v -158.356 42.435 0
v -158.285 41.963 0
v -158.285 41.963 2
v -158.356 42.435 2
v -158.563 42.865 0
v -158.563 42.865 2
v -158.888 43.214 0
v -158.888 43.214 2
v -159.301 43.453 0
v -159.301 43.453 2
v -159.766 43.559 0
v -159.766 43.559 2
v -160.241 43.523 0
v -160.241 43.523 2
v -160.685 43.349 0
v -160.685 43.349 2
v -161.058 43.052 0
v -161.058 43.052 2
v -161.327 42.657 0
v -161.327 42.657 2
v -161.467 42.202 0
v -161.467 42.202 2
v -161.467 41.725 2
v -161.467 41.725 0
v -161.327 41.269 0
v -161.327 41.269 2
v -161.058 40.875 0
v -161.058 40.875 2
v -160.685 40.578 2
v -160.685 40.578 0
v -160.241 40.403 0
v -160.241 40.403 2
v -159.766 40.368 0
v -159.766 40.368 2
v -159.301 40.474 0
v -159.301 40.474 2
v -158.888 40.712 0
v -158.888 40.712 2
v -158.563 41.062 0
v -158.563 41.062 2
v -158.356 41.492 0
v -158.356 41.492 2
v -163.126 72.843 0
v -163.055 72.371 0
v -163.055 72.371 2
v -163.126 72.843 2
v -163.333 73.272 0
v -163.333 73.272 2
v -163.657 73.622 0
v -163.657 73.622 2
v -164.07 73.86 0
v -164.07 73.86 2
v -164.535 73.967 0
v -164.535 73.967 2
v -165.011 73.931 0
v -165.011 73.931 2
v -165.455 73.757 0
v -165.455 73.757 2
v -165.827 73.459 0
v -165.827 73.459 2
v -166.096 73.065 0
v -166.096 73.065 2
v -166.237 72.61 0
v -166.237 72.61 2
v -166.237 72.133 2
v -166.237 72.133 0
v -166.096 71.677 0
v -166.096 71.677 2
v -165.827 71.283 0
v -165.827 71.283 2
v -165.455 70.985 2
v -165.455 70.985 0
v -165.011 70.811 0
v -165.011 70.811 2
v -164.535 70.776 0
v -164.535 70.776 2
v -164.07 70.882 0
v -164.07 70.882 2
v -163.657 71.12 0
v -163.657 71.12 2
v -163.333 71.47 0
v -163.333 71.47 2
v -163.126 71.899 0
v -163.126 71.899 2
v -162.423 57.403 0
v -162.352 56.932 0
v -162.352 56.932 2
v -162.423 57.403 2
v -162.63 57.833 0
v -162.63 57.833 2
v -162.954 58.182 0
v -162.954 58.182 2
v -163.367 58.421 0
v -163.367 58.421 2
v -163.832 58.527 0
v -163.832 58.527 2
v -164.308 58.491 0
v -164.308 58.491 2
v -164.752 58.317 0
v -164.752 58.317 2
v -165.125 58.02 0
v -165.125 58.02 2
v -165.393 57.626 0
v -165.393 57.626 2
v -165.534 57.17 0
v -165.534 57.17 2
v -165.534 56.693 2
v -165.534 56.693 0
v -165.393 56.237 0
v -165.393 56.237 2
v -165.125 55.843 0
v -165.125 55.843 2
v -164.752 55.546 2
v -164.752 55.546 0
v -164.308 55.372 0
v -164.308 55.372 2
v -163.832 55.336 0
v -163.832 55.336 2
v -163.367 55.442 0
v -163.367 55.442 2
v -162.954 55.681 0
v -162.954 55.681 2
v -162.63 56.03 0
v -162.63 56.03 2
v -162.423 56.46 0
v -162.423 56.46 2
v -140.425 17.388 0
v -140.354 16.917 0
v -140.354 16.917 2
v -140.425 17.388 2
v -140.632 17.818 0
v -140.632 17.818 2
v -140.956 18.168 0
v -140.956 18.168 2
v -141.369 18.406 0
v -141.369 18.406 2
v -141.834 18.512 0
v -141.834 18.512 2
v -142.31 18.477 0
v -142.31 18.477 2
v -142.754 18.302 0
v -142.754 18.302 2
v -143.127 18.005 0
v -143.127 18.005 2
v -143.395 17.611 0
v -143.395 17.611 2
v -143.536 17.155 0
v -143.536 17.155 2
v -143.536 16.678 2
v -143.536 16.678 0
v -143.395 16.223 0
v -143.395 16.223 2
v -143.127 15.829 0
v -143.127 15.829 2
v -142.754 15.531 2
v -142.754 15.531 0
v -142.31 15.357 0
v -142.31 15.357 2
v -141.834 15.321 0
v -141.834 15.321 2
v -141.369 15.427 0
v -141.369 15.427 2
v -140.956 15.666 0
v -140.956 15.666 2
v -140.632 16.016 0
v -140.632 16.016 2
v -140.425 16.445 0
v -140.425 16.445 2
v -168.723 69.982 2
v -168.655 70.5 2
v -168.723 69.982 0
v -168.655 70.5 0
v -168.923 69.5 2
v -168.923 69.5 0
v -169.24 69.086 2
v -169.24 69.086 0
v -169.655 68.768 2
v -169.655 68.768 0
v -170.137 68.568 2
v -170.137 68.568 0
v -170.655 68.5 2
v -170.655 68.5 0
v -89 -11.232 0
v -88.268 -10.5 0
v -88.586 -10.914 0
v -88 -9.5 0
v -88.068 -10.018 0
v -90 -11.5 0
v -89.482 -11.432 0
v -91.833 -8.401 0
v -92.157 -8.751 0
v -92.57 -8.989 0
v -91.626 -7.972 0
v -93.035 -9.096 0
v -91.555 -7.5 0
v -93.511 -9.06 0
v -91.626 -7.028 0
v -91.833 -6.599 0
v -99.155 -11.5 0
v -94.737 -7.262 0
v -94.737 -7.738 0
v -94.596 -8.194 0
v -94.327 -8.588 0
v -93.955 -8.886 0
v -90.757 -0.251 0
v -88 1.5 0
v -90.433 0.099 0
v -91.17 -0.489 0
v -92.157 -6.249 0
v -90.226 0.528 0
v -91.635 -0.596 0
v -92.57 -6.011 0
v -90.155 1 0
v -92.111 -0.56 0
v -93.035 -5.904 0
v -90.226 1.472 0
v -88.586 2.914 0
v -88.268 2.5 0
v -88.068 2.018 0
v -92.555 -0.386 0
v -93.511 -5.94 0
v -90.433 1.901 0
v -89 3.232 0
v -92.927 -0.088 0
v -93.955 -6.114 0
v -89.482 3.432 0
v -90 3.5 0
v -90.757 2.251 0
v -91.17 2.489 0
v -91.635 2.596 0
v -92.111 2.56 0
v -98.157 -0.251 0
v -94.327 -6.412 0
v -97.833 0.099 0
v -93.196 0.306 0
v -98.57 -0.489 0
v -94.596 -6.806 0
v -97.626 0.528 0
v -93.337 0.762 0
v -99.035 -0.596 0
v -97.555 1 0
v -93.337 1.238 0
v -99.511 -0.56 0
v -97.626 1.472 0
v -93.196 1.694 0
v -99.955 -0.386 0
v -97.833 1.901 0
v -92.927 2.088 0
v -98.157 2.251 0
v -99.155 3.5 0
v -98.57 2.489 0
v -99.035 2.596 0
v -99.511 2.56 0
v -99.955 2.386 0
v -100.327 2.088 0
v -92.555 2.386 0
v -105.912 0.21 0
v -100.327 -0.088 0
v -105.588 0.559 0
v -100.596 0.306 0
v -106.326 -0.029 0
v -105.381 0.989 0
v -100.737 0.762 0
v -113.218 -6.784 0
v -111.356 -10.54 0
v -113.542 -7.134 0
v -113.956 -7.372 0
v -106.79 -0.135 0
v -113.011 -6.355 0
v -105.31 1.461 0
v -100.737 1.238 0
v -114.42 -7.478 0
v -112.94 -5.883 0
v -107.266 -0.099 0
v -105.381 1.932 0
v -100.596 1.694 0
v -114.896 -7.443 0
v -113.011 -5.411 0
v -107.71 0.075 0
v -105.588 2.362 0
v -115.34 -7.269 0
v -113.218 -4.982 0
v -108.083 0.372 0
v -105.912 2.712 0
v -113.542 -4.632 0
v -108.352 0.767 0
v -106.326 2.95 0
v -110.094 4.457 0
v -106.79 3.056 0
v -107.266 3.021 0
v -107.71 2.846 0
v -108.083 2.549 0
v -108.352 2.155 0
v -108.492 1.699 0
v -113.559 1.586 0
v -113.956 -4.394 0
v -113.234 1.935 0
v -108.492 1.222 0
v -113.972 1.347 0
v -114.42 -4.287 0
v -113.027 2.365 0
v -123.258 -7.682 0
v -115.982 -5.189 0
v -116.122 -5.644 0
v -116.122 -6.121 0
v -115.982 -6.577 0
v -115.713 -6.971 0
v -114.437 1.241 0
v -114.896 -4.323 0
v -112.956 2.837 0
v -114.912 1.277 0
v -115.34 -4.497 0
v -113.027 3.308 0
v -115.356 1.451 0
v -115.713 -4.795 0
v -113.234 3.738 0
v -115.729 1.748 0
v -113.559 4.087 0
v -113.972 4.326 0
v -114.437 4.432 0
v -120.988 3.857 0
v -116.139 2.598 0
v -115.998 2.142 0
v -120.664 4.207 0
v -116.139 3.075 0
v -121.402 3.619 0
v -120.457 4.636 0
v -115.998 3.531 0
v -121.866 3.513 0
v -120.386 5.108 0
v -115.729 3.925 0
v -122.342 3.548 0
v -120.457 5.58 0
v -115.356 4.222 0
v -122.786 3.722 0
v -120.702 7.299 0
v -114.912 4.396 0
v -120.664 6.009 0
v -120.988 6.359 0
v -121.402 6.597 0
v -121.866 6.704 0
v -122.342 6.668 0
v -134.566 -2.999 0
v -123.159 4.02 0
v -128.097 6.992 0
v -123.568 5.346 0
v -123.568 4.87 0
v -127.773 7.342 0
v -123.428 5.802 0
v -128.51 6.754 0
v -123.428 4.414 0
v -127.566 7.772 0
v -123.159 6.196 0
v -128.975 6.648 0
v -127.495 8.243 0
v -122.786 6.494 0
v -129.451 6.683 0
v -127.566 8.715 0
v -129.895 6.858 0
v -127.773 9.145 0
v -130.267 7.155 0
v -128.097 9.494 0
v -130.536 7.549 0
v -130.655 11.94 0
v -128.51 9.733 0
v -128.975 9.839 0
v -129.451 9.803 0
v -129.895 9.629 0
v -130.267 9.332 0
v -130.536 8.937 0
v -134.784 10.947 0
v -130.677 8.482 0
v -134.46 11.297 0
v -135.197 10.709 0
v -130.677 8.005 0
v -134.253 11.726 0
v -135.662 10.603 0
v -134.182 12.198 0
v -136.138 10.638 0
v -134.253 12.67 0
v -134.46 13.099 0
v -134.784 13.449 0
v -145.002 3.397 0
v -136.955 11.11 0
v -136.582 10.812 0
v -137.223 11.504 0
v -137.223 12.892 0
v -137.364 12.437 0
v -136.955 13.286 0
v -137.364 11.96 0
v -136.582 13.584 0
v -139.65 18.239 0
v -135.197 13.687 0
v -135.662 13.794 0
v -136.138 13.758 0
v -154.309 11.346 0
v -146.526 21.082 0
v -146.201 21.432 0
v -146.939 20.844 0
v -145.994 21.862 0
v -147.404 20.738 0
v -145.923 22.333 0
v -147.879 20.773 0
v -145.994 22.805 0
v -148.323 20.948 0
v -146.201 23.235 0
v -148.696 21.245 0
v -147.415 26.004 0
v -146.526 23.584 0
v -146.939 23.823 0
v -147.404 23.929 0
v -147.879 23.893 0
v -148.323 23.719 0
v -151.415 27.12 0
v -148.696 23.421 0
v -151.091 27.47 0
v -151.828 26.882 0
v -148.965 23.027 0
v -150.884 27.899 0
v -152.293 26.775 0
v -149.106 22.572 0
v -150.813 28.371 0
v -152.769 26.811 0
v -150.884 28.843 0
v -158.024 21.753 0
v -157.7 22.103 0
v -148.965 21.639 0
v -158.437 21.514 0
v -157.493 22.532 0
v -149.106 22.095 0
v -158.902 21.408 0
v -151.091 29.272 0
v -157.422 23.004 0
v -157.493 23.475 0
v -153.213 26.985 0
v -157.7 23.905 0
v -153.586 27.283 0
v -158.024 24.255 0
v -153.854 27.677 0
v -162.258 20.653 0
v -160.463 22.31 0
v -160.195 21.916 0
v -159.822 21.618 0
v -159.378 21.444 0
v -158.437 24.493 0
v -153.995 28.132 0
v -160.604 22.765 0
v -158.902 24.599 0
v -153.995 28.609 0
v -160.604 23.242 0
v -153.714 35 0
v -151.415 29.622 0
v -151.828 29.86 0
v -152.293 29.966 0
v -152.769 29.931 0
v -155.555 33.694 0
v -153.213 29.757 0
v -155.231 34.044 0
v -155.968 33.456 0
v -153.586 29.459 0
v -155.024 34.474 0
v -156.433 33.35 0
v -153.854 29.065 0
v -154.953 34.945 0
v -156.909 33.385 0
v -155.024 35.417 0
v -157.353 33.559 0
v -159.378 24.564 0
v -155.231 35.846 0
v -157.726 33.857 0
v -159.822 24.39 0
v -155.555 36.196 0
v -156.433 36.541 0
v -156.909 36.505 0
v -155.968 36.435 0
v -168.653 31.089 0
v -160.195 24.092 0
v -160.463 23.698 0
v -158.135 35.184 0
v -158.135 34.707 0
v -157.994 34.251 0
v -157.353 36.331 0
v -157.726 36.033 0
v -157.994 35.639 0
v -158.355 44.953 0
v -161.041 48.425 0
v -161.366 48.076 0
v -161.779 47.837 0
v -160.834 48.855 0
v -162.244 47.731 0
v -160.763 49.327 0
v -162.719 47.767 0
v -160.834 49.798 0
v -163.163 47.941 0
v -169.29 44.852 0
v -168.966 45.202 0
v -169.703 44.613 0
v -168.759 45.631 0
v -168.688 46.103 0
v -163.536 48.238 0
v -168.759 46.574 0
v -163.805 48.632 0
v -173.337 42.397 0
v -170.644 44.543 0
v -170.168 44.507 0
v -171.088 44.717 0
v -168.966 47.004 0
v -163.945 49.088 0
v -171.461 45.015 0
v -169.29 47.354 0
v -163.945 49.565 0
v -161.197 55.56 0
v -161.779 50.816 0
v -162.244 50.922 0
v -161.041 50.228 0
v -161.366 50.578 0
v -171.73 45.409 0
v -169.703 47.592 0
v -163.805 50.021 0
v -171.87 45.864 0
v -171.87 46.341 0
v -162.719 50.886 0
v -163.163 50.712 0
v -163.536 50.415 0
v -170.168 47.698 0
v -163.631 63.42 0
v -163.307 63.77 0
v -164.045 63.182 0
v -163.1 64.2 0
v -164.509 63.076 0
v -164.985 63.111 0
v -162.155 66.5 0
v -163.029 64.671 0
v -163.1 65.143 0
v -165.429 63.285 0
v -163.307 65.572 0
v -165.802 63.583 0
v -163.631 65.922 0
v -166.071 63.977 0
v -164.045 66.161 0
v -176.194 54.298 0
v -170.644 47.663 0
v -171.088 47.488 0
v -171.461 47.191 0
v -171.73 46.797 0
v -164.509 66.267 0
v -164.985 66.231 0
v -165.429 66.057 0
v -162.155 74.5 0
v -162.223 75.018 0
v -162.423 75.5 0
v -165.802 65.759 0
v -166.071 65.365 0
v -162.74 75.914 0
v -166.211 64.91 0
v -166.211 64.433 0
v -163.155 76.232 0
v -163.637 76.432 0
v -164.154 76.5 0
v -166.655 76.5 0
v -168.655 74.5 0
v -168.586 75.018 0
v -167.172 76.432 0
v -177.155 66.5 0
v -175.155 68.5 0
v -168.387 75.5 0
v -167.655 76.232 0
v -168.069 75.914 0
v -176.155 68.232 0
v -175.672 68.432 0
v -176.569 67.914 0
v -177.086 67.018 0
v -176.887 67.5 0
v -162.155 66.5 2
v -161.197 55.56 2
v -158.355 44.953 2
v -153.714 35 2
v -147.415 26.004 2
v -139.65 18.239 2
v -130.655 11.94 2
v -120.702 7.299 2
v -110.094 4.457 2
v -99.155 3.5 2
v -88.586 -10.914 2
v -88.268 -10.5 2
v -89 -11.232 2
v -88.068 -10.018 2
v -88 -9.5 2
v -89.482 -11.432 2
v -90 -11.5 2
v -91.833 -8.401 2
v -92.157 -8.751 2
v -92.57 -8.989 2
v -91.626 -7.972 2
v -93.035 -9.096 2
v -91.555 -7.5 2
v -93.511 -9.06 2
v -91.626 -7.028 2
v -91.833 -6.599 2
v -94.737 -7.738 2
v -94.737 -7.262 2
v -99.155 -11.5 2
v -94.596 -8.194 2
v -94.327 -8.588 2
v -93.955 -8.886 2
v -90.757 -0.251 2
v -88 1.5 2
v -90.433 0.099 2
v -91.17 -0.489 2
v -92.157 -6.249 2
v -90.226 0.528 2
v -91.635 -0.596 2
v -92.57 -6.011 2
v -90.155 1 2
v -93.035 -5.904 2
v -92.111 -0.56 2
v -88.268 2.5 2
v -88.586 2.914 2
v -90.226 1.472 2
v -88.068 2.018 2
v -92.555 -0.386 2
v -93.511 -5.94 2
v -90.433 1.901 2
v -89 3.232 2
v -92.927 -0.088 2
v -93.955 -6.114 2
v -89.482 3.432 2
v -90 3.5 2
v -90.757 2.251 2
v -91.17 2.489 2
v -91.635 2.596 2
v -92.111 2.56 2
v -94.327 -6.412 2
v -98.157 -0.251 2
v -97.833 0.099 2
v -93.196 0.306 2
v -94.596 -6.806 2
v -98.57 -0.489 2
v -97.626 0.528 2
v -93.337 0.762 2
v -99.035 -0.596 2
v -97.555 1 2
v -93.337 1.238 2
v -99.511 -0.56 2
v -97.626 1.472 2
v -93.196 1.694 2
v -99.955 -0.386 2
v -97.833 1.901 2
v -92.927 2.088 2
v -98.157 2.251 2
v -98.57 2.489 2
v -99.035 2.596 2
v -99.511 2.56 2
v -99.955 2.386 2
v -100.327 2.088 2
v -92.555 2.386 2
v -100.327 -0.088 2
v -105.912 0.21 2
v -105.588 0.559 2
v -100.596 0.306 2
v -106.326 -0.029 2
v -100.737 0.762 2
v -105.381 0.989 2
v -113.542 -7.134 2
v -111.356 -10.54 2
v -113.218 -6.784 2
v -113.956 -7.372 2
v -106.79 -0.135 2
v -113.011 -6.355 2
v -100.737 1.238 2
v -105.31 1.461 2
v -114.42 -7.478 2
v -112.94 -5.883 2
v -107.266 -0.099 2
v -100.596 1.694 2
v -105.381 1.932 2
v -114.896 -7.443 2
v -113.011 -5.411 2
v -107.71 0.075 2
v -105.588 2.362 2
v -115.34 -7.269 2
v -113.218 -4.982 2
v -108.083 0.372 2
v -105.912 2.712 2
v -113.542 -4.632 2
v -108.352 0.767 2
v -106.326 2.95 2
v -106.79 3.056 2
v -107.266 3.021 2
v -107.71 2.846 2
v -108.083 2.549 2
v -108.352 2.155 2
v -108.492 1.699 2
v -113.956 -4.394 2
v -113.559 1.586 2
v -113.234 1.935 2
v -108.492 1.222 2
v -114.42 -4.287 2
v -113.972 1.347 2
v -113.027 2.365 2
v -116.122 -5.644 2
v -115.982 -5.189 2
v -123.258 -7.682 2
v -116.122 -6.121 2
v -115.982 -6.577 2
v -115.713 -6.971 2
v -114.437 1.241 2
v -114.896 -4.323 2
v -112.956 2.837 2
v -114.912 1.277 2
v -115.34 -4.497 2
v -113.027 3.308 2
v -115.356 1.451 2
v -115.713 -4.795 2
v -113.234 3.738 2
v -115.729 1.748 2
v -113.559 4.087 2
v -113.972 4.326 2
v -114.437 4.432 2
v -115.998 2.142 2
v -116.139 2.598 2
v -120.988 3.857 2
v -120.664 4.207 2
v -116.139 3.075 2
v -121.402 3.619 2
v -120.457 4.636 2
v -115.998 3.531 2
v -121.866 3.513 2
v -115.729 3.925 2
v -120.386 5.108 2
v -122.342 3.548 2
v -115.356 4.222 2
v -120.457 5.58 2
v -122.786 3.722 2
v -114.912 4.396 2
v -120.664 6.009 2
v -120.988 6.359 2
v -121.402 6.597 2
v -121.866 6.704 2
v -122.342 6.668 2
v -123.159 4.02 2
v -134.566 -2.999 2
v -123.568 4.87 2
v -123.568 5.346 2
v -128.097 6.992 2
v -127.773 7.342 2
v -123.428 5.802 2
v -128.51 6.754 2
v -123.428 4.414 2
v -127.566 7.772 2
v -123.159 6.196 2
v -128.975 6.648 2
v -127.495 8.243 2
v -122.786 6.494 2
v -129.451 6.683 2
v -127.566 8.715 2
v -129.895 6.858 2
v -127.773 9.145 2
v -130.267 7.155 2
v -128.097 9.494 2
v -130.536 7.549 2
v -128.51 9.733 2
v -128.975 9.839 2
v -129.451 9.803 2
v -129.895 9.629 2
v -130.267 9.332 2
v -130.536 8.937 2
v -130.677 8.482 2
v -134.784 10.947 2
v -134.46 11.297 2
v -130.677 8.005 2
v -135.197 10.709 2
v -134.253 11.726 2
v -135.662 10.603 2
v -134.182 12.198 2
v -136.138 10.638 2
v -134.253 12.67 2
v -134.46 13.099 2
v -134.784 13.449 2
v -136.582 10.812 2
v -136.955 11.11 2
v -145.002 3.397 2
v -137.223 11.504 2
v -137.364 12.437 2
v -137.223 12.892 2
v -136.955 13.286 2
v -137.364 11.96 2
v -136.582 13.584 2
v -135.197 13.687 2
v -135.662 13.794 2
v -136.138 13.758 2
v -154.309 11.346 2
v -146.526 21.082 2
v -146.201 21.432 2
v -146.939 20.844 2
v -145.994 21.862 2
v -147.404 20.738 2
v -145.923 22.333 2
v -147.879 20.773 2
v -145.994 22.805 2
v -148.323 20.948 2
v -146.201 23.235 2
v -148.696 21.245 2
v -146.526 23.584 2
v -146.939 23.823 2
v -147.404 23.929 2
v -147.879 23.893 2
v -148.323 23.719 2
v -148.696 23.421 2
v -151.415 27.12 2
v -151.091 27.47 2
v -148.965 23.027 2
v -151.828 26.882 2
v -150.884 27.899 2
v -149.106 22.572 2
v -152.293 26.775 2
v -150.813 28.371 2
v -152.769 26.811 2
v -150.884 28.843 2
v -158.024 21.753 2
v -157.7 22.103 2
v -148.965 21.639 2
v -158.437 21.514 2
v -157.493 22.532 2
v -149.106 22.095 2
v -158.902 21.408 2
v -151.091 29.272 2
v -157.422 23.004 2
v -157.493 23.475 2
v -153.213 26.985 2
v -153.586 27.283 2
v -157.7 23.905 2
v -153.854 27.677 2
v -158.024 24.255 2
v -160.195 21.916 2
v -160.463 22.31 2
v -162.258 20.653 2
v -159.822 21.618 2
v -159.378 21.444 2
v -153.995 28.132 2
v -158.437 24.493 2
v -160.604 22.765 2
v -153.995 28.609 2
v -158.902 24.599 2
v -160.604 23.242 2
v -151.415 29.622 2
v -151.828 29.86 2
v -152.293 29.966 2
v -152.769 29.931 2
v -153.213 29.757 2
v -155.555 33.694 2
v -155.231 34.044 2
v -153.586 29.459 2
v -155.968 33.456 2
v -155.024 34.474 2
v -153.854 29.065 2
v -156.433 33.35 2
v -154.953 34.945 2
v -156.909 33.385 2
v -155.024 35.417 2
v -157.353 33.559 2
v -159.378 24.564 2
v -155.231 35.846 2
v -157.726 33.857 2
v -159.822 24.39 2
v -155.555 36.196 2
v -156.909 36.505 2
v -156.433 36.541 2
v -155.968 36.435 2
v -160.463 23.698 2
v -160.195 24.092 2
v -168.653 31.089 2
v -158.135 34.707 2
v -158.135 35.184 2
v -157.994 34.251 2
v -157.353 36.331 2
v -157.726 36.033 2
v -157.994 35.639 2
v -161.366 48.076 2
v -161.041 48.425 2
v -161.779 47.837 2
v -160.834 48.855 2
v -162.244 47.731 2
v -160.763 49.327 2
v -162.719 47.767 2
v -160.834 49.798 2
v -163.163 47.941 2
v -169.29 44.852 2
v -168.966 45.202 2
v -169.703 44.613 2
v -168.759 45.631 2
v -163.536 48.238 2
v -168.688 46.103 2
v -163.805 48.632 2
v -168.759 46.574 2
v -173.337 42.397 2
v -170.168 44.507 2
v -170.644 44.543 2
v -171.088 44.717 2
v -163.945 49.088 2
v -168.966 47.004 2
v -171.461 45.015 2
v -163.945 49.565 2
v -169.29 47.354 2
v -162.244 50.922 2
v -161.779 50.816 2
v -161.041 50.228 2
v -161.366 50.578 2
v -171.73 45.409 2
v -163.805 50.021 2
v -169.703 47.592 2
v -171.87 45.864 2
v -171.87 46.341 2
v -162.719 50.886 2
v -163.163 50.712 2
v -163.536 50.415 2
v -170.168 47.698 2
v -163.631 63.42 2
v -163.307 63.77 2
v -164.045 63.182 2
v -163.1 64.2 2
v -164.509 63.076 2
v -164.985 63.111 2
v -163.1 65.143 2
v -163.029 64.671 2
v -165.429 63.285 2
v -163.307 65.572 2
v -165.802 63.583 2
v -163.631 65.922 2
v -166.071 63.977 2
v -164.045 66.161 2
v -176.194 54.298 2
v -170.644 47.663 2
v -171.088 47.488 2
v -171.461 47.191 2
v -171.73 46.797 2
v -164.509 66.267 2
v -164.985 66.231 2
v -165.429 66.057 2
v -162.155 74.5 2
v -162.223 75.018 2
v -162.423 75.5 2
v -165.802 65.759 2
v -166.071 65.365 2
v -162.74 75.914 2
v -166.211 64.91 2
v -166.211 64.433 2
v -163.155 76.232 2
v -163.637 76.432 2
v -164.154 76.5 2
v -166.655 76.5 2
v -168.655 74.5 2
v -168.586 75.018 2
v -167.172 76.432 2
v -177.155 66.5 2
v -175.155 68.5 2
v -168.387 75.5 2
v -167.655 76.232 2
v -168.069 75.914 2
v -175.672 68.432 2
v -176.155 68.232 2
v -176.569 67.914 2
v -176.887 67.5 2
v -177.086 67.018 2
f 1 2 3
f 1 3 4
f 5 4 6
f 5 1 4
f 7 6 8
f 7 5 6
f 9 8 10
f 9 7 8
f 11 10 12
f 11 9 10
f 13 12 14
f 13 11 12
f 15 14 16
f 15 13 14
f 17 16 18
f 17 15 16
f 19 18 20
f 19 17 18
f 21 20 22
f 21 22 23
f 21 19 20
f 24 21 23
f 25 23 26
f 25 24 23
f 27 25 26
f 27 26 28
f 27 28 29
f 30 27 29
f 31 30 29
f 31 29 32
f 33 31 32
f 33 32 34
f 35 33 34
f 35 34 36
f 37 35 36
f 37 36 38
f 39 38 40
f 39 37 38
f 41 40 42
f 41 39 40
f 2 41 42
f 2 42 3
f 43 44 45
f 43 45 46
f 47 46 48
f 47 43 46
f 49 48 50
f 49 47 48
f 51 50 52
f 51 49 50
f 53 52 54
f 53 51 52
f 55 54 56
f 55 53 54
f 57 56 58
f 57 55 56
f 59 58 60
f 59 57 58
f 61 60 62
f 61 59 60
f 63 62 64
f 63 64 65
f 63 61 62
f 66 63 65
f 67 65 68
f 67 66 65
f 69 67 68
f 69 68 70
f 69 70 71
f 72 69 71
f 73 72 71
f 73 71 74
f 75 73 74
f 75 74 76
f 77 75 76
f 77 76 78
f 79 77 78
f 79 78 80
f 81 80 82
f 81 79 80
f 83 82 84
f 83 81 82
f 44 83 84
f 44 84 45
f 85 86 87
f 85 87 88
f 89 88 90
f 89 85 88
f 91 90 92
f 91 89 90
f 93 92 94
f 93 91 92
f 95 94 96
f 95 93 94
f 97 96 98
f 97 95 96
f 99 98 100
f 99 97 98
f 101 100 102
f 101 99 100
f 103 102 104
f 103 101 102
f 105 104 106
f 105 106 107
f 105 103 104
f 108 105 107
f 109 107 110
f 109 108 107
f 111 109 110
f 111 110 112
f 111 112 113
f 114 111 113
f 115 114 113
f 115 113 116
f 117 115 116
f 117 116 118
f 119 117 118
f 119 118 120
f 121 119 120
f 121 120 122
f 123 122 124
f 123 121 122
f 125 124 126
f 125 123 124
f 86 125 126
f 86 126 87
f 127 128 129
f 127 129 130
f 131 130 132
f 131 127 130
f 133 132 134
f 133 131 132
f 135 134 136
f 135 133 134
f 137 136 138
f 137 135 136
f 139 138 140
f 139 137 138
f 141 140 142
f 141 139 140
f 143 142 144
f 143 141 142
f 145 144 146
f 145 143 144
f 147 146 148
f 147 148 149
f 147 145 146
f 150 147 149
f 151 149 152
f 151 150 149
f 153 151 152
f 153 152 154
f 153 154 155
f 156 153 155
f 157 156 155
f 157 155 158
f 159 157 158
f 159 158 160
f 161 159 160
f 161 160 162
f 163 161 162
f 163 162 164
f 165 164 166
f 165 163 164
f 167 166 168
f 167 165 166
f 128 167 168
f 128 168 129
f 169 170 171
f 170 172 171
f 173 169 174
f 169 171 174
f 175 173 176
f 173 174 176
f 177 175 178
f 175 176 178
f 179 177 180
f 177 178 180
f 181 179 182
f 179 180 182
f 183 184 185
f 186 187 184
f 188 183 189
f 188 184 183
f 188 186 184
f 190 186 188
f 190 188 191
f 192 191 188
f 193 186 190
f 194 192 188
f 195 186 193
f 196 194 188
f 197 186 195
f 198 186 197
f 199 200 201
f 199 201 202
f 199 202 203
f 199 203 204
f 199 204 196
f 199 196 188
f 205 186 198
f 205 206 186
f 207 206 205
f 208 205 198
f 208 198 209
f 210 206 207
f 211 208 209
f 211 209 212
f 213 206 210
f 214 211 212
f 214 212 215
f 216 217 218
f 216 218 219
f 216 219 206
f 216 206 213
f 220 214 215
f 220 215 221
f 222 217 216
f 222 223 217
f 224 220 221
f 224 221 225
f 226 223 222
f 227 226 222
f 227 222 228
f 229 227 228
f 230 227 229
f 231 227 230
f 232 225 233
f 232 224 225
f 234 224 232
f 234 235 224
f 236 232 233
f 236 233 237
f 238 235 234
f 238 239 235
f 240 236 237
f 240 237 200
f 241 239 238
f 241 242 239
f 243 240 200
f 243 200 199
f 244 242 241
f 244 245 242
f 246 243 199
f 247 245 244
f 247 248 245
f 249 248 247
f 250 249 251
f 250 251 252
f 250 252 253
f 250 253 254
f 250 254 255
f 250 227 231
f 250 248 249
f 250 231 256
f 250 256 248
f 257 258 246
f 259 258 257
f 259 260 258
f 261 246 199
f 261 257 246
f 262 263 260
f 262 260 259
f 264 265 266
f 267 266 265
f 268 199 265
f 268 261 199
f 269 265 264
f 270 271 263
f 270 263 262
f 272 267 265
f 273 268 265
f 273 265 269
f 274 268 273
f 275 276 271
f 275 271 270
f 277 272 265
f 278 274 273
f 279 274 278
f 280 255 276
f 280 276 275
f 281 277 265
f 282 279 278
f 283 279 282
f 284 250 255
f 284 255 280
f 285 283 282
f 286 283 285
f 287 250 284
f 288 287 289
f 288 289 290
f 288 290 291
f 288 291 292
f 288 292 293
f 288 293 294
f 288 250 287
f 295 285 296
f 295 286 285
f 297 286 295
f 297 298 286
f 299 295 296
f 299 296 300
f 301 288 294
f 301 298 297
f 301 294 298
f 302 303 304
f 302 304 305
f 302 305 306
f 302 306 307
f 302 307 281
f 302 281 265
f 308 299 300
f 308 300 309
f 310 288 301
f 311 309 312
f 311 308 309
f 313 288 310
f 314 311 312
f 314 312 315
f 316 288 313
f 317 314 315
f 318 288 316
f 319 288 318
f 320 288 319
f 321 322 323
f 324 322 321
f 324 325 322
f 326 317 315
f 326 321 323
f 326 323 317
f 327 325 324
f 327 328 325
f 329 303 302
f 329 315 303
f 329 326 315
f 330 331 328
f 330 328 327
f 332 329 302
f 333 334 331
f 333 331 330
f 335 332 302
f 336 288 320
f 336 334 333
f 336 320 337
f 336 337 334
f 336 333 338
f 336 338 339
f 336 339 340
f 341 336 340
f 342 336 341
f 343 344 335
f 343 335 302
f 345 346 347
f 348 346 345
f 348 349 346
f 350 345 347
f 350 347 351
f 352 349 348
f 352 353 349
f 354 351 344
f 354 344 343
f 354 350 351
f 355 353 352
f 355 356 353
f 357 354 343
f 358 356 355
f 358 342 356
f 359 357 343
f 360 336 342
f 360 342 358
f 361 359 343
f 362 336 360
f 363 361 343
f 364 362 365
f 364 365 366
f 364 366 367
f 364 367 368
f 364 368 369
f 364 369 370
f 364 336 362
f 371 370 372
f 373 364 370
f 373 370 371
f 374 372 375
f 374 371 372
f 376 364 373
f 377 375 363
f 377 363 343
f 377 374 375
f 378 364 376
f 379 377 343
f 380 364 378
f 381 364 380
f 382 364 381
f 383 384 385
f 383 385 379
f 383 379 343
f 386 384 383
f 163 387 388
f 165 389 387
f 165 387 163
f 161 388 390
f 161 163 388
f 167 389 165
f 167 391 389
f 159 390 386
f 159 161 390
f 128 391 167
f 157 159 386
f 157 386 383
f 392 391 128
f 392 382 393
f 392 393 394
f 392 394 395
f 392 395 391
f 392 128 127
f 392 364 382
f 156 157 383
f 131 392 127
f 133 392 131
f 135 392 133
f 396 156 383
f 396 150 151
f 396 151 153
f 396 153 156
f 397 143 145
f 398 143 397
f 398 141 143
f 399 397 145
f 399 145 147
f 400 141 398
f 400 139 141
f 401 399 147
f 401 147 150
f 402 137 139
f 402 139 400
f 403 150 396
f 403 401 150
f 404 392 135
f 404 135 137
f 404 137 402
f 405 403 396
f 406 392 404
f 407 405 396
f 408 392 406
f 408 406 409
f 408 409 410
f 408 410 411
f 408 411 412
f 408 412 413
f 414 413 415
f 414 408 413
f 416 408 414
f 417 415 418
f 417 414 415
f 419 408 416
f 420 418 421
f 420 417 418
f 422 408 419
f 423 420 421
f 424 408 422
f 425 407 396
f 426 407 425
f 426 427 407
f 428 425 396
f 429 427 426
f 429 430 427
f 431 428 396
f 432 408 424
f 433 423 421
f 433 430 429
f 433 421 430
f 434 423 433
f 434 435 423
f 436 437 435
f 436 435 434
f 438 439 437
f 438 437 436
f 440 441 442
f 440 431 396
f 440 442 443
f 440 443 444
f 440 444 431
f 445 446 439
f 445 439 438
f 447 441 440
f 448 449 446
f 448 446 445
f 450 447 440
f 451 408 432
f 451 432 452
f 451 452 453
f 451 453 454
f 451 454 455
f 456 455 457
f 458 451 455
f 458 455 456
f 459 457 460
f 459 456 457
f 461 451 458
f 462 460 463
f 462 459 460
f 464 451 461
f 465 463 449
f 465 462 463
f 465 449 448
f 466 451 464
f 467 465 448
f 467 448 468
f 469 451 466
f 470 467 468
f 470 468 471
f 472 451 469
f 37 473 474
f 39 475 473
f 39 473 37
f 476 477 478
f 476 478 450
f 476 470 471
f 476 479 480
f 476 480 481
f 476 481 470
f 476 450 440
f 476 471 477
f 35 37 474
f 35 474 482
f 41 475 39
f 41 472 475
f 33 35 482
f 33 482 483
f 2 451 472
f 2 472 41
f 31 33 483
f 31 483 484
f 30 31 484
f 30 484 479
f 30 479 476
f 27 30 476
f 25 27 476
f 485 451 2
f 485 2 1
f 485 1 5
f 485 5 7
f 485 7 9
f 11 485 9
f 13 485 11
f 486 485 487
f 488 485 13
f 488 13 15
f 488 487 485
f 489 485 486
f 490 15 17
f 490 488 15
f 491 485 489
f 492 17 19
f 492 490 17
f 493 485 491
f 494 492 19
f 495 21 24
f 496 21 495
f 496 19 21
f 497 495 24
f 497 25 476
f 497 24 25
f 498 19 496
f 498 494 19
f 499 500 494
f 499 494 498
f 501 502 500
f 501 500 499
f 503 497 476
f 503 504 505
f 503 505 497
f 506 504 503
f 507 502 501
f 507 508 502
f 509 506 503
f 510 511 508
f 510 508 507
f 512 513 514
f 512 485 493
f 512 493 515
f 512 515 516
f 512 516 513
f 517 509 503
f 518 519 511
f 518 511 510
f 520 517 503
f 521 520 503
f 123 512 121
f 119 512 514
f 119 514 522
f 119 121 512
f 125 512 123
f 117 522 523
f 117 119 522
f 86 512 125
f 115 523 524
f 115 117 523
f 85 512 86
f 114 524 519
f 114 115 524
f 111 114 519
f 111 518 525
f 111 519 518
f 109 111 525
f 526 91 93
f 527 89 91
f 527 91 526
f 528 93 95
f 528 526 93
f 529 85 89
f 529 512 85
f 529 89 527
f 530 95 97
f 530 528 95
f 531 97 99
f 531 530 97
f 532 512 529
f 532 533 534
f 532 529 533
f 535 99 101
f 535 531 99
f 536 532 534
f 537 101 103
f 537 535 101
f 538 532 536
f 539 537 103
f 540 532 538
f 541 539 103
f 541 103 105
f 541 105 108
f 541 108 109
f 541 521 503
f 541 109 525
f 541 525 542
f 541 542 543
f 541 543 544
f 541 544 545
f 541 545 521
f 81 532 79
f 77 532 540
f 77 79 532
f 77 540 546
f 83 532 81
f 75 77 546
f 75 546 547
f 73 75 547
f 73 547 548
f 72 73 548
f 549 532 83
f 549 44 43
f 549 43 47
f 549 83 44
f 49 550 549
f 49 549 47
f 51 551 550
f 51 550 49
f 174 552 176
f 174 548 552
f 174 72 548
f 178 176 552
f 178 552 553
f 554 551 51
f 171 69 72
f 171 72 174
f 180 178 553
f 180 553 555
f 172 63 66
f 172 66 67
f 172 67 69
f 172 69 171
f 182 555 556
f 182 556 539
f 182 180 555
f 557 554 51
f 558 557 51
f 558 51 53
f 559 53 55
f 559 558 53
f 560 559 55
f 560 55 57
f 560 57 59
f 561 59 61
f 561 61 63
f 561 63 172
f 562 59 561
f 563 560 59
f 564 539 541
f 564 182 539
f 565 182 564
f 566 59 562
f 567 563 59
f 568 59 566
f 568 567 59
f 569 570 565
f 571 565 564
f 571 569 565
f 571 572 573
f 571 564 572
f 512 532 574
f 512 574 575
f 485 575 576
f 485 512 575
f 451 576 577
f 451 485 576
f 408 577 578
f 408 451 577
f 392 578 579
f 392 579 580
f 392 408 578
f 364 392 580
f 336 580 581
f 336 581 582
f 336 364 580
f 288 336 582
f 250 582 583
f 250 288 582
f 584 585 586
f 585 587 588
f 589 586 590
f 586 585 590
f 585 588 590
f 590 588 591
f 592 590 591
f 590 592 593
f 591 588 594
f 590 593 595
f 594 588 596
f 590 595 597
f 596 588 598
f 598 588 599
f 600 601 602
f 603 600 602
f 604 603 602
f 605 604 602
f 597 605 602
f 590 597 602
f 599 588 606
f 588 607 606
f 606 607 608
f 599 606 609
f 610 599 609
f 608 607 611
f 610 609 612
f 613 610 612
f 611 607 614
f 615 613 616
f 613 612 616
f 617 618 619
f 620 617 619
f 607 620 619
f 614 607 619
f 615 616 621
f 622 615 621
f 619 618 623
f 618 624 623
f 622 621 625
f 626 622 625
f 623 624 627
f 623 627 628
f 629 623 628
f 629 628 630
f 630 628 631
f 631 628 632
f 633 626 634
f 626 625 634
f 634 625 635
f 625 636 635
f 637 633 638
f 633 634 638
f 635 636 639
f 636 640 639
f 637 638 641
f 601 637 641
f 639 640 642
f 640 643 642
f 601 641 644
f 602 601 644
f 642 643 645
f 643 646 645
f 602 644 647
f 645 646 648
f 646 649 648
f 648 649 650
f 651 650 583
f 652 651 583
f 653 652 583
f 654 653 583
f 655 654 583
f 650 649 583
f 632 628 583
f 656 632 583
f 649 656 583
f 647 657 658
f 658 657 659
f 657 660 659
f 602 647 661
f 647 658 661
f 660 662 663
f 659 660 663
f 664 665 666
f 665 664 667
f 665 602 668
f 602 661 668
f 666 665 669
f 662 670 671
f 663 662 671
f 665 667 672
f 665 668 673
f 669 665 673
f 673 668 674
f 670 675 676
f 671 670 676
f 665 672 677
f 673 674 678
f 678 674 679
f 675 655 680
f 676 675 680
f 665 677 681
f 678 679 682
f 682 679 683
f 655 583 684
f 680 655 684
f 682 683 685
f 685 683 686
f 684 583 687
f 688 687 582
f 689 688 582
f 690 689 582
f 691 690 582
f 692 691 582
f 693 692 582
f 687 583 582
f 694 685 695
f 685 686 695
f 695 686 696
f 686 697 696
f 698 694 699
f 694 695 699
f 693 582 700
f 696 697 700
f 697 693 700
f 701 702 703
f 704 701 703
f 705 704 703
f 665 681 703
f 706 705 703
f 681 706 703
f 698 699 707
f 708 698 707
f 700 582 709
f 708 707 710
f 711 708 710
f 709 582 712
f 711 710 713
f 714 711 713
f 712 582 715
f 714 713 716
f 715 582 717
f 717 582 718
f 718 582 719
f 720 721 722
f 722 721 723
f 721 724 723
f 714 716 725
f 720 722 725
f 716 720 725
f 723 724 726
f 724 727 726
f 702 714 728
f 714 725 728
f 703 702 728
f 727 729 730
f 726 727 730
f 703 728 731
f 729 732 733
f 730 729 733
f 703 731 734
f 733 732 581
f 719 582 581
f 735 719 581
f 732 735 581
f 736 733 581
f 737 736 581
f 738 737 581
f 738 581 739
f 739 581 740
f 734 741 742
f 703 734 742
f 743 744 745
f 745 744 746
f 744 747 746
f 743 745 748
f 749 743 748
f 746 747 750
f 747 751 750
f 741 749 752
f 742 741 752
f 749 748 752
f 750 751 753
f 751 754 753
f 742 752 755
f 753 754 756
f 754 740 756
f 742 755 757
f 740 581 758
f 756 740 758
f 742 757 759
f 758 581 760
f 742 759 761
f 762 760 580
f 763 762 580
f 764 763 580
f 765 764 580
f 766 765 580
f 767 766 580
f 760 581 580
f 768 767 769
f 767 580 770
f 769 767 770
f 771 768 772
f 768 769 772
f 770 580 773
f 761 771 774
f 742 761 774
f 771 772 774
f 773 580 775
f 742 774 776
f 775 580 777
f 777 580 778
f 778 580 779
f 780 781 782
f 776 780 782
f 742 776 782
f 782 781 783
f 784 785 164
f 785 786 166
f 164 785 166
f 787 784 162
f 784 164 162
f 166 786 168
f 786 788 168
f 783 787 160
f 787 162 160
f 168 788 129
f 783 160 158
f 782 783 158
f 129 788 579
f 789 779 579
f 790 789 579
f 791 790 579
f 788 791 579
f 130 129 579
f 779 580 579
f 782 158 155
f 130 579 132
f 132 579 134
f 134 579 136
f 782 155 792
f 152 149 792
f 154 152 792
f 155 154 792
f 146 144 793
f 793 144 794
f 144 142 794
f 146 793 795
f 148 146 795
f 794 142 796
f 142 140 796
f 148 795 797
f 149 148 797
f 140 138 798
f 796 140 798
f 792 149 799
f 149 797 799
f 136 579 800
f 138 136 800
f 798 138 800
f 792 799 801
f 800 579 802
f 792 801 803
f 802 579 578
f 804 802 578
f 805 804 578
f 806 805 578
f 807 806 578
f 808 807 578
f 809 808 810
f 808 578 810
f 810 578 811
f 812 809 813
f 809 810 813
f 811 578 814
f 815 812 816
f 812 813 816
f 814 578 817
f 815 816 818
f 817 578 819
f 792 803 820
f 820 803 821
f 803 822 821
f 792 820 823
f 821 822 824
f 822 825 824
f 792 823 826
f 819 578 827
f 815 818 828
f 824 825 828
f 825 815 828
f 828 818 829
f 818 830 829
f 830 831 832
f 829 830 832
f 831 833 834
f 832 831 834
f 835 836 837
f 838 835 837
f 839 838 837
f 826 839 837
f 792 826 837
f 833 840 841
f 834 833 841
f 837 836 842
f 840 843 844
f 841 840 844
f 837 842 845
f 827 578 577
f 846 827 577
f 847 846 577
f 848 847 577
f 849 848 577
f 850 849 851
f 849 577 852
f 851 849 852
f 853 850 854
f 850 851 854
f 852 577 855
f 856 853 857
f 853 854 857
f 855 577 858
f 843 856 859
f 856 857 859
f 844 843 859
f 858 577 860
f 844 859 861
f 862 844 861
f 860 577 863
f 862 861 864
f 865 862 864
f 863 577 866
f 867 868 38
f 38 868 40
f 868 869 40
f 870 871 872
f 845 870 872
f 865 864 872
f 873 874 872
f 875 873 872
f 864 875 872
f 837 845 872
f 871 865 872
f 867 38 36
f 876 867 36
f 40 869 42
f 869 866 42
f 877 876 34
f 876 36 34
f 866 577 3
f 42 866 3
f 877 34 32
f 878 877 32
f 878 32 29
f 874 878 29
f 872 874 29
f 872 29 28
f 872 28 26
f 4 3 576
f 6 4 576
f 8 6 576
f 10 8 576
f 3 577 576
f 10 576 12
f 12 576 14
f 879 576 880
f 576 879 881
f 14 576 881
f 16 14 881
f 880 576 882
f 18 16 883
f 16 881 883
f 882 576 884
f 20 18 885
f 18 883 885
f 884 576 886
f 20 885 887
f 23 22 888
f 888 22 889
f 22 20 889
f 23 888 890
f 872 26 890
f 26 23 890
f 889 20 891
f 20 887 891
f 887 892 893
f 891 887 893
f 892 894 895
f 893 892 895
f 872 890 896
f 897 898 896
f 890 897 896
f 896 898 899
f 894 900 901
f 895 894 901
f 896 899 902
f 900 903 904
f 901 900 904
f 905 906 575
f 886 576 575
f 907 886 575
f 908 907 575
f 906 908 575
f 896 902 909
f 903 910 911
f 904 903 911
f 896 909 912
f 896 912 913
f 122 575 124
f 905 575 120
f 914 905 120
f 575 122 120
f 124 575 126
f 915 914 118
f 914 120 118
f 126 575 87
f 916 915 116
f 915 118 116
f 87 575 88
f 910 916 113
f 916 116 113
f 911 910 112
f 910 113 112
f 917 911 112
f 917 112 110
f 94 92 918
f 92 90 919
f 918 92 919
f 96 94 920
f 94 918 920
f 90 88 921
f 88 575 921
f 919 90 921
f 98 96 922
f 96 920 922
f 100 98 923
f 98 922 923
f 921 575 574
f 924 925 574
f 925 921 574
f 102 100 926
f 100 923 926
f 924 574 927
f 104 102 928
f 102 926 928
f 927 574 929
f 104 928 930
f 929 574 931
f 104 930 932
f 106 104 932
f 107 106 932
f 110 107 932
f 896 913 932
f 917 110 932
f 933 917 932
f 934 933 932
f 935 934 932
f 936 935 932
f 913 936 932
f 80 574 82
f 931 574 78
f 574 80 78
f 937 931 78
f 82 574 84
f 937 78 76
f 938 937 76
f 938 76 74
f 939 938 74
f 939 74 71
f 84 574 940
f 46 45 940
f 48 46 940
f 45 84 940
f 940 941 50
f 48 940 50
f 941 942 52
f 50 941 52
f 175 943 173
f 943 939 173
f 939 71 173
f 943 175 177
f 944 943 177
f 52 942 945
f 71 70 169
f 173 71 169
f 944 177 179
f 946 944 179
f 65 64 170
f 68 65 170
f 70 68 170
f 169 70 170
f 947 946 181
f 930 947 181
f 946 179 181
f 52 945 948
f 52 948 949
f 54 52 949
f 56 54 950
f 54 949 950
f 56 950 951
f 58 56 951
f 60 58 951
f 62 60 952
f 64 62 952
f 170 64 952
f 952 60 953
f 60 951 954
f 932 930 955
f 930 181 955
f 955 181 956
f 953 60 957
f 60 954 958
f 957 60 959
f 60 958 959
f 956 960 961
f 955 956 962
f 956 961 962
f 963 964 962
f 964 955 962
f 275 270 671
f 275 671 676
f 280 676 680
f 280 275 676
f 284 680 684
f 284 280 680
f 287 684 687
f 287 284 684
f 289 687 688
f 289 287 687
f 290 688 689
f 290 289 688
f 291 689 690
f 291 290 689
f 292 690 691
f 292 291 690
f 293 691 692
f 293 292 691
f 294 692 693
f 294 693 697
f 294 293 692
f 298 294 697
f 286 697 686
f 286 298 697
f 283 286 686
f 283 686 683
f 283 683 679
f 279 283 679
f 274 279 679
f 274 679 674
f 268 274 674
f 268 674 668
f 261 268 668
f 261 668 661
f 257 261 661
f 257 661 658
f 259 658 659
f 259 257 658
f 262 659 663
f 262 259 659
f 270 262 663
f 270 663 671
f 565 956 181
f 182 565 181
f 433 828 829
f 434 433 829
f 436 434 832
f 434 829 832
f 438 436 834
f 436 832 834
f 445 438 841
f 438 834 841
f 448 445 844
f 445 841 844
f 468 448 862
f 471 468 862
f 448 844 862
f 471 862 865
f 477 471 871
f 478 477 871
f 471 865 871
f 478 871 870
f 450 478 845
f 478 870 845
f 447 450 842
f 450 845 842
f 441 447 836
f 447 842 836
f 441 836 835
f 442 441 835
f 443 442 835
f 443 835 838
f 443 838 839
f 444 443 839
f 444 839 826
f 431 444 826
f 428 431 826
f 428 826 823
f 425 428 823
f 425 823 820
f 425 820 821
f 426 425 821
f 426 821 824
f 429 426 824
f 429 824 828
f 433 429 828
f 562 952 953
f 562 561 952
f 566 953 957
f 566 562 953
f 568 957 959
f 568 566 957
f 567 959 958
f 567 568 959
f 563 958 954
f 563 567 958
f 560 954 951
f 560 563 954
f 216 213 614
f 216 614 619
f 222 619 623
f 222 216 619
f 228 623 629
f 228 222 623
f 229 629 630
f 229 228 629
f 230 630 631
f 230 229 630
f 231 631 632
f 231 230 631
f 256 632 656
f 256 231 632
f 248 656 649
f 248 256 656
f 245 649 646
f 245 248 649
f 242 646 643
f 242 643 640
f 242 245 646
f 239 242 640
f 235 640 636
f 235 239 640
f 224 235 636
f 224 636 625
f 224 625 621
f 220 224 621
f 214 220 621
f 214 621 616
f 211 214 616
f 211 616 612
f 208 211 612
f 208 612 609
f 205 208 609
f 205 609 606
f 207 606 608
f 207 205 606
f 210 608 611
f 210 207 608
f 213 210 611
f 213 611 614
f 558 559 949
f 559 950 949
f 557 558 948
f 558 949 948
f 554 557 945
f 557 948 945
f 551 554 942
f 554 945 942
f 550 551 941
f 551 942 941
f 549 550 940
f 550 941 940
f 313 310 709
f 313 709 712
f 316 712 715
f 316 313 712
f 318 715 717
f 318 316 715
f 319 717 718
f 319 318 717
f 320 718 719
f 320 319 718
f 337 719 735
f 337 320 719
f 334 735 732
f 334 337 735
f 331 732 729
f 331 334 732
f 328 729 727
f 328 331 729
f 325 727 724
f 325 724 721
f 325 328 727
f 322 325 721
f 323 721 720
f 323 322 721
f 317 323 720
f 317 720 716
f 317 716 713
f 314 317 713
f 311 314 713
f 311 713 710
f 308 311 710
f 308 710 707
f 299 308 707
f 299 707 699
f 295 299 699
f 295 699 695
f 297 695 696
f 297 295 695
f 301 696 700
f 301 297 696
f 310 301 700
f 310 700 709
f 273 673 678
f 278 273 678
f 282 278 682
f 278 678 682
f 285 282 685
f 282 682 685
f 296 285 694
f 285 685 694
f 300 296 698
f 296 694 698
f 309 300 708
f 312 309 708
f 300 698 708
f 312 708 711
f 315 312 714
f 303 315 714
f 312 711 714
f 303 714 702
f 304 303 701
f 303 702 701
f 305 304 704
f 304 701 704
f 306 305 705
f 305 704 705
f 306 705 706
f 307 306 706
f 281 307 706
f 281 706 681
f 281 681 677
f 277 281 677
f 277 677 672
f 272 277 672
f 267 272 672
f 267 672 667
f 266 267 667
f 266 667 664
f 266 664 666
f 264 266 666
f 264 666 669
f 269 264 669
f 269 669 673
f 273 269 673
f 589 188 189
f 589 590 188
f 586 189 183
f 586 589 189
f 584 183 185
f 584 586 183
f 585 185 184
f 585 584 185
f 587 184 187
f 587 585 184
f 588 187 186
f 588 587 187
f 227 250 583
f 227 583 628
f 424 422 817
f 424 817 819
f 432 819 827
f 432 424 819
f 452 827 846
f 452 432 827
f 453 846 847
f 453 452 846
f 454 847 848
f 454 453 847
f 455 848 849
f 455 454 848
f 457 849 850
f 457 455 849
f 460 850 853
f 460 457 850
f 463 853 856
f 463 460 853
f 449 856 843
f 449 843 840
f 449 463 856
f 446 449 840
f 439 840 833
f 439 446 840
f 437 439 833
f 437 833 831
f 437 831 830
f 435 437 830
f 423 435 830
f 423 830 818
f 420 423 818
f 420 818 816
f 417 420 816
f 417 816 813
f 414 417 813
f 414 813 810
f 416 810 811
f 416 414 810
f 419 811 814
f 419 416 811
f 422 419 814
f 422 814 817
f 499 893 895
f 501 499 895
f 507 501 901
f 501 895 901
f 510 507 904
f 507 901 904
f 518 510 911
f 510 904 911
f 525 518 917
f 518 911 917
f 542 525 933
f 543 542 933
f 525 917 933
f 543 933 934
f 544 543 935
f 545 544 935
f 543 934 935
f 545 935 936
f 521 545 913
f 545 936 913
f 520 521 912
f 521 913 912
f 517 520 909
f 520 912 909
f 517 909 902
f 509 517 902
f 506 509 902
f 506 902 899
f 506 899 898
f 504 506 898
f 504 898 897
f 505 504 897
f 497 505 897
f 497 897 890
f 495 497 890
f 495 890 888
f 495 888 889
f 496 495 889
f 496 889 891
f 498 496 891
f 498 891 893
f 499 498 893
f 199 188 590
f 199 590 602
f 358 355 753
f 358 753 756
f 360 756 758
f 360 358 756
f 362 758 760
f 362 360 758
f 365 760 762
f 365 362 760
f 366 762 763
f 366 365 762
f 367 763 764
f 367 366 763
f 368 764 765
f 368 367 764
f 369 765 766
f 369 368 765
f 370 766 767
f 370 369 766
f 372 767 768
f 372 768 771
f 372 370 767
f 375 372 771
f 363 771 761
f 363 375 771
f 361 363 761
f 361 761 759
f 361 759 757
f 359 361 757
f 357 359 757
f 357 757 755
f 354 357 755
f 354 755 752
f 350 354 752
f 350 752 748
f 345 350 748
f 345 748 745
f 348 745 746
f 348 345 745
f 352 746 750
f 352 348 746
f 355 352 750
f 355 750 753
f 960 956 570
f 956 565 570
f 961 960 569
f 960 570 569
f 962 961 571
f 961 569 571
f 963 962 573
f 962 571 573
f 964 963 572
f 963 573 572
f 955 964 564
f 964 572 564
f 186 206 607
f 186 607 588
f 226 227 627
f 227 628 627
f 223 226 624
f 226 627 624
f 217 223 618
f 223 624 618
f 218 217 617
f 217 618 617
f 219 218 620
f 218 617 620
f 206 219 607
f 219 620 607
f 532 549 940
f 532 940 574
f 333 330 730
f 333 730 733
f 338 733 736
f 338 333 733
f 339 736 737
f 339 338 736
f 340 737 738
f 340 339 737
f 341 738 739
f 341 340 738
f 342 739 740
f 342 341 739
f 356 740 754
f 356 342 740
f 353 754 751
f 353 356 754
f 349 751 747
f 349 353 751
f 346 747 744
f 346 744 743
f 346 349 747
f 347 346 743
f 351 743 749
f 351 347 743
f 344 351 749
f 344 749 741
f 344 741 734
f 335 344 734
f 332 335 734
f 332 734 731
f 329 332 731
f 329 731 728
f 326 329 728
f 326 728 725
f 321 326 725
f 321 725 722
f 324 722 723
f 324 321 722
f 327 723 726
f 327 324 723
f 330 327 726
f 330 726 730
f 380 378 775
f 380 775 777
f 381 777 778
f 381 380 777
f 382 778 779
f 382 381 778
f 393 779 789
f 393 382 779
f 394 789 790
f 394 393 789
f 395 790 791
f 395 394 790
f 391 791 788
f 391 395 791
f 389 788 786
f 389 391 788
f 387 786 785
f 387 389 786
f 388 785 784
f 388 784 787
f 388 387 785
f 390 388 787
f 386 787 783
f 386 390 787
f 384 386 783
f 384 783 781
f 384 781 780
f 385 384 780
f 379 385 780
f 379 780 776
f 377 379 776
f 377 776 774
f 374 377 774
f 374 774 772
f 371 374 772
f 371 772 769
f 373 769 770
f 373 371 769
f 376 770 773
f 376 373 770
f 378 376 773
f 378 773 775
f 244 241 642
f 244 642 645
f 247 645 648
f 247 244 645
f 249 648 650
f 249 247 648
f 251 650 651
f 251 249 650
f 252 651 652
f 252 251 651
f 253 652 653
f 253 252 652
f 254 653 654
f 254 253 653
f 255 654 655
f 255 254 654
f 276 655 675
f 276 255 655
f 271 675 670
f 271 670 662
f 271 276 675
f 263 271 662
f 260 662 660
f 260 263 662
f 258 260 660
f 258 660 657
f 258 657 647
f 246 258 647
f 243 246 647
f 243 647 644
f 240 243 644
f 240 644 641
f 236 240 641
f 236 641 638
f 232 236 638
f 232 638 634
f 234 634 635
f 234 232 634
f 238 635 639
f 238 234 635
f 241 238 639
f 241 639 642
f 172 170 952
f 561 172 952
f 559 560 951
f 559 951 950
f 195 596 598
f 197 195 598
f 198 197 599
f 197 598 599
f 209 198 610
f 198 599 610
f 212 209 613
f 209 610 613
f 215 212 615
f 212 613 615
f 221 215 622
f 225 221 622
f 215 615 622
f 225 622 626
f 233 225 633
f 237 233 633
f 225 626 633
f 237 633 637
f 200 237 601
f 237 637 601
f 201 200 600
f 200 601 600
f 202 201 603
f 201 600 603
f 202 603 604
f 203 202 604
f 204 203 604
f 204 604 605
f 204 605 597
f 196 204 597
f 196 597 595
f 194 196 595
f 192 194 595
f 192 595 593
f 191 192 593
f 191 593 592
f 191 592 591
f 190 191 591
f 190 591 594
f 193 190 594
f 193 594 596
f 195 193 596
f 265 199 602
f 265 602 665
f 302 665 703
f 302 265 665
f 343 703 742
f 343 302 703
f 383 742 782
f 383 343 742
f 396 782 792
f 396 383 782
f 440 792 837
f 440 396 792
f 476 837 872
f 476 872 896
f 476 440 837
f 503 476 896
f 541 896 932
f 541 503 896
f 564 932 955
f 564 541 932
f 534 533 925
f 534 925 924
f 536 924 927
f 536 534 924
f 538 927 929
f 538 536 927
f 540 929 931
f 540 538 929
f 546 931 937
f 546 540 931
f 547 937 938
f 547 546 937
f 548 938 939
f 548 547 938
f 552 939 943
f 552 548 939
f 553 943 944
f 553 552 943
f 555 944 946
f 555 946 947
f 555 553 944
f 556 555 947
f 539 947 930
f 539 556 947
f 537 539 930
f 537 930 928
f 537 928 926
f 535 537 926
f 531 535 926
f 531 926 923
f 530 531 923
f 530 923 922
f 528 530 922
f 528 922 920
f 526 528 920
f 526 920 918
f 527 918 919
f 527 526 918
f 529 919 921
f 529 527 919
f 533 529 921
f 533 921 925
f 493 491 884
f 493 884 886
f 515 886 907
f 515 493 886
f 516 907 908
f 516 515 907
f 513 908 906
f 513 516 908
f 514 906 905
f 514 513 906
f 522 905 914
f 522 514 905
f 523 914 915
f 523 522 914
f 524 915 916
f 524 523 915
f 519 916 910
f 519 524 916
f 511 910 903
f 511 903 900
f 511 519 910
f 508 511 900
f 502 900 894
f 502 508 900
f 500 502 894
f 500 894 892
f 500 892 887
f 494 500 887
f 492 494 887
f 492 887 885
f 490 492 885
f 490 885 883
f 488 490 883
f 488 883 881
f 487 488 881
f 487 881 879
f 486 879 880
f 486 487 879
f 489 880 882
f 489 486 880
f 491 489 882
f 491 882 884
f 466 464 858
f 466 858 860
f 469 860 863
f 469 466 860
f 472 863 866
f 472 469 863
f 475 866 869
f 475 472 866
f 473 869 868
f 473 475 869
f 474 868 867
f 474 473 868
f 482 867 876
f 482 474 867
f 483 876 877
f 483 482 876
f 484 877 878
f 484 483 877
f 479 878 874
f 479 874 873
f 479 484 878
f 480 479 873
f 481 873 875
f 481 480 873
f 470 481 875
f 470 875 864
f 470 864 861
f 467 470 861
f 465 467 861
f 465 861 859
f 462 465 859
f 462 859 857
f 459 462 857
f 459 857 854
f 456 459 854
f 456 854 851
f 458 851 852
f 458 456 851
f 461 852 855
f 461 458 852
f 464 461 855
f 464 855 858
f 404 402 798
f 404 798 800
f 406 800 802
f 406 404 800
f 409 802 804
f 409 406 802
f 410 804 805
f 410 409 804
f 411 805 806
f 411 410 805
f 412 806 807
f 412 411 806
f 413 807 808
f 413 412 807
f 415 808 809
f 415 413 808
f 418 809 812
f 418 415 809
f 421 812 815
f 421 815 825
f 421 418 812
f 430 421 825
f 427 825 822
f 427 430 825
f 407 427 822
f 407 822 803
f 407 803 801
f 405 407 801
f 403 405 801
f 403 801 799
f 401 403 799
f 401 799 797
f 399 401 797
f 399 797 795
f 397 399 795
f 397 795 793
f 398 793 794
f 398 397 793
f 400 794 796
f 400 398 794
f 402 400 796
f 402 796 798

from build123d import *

# Parameters (mm, degrees)
SKETCH_2_R          = 1.6
EXTRUDE_1_DEPTH     = 2
SKETCH_4_W          = 8.5
SKETCH_4_H          = 8
CUT_EXTRUDE_1_DEPTH = 3
SKETCH_6_R          = 1.6
CUT_EXTRUDE_2_DEPTH = 10
FILLET_1_R          = 2
FILLET_2_R          = 2


with BuildPart() as part:
    # 草图2 → 凸台-拉伸1 (new body)
    with BuildSketch(Plane.XY):
        with BuildLine():
            Line((-162.154590294, 76.5), (-162.154590294, 66.5))
            ThreePointArc((-162.154590294, 66.5), (-143.702317509, 21.952272785), (-99.154590294, 3.5))
            Line((-99.154590294, 3.5), (-88, 3.5))
            Line((-88, 3.5), (-88, -11.5))
            Line((-88, -11.5), (-99.154590294, -11.5))
            ThreePointArc((-99.154590294, -11.5), (-154.308919227, 11.345671067), (-177.154590294, 66.5))
            Line((-177.154590294, 66.5), (-177.154590294, 76.5))
            Line((-177.154590294, 76.5), (-162.154590294, 76.5))
        make_face()
        with Locations((-91.754590294, 1)):
            Circle(SKETCH_2_R, mode=Mode.SUBTRACT)
        with Locations((-99.154590294, 1)):
            Circle(SKETCH_2_R, mode=Mode.SUBTRACT)
        with Locations((-106.910050218, 1.460759219)):
            Circle(SKETCH_2_R, mode=Mode.SUBTRACT)
        with Locations((-114.556398703, 2.836554462)):
            Circle(SKETCH_2_R, mode=Mode.SUBTRACT)
        with Locations((-121.986059394, 5.108029688)):
            Circle(SKETCH_2_R, mode=Mode.SUBTRACT)
        with Locations((-129.094504517, 8.243227549)):
            Circle(SKETCH_2_R, mode=Mode.SUBTRACT)
        with Locations((-135.781725472, 12.198038998)):
            Circle(SKETCH_2_R, mode=Mode.SUBTRACT)
        with Locations((-141.953639856, 16.916823855)):
            Circle(SKETCH_2_R, mode=Mode.SUBTRACT)
        with Locations((-147.523415105, 22.333193613)):
            Circle(SKETCH_2_R, mode=Mode.SUBTRACT)
        with Locations((-152.412690143, 28.370945455)):
            Circle(SKETCH_2_R, mode=Mode.SUBTRACT)
        with Locations((-156.552677837, 34.945134346)):
            Circle(SKETCH_2_R, mode=Mode.SUBTRACT)
        with Locations((-159.885132769, 41.963268131)):
            Circle(SKETCH_2_R, mode=Mode.SUBTRACT)
        with Locations((-162.363170682, 49.326608799)):
            Circle(SKETCH_2_R, mode=Mode.SUBTRACT)
        with Locations((-163.951928103, 56.931561629)):
            Circle(SKETCH_2_R, mode=Mode.SUBTRACT)
        with Locations((-164.62905283, 64.671132664)):
            Circle(SKETCH_2_R, mode=Mode.SUBTRACT)
        with Locations((-164.654590294, 72.371090315)):
            Circle(SKETCH_2_R, mode=Mode.SUBTRACT)
    extrude(amount=EXTRUDE_1_DEPTH)

    # 草图4 → 切除-拉伸1 (cut)
    with BuildSketch(Plane.XY.offset(2)):
        with Locations((-172.904590294, 72.5)):
            Rectangle(SKETCH_4_W, SKETCH_4_H)
    extrude(amount=-CUT_EXTRUDE_1_DEPTH, mode=Mode.SUBTRACT)

    # 草图6 → 切除-拉伸2 (cut)
    with BuildSketch(Plane.XY.offset(2)):
        with Locations((-170.287955794, 46.10283567)):
            Circle(SKETCH_6_R)
        with Locations((-159.021847878, 23.00389133)):
            Circle(SKETCH_6_R)
        with Locations((-114.540055415, -5.882922454)):
            Circle(SKETCH_6_R)
        with Locations((-93.154590294, -7.5)):
            Circle(SKETCH_6_R)
    extrude(amount=-CUT_EXTRUDE_2_DEPTH, mode=Mode.SUBTRACT)

    # 圆角1
    fillet_1_edges = [part.edges().sort_by_distance(p)[0] for p in [
        (-168.654590294, 68.5, 1),
    ]]
    fillet(fillet_1_edges, radius=FILLET_1_R)

    # 圆角2
    fillet_2_edges = [part.edges().sort_by_distance(p)[0] for p in [
        (-168.654590294, 76.5, 1),
        (-162.154590294, 76.5, 1),
        (-88, 3.5, 1),
        (-88, -11.5, 1),
        (-177.154590294, 68.5, 1),
    ]]
    fillet(fillet_2_edges, radius=FILLET_2_R - 0.0001)  # a hair under: the kernel refuses the full size


solid = part.part
